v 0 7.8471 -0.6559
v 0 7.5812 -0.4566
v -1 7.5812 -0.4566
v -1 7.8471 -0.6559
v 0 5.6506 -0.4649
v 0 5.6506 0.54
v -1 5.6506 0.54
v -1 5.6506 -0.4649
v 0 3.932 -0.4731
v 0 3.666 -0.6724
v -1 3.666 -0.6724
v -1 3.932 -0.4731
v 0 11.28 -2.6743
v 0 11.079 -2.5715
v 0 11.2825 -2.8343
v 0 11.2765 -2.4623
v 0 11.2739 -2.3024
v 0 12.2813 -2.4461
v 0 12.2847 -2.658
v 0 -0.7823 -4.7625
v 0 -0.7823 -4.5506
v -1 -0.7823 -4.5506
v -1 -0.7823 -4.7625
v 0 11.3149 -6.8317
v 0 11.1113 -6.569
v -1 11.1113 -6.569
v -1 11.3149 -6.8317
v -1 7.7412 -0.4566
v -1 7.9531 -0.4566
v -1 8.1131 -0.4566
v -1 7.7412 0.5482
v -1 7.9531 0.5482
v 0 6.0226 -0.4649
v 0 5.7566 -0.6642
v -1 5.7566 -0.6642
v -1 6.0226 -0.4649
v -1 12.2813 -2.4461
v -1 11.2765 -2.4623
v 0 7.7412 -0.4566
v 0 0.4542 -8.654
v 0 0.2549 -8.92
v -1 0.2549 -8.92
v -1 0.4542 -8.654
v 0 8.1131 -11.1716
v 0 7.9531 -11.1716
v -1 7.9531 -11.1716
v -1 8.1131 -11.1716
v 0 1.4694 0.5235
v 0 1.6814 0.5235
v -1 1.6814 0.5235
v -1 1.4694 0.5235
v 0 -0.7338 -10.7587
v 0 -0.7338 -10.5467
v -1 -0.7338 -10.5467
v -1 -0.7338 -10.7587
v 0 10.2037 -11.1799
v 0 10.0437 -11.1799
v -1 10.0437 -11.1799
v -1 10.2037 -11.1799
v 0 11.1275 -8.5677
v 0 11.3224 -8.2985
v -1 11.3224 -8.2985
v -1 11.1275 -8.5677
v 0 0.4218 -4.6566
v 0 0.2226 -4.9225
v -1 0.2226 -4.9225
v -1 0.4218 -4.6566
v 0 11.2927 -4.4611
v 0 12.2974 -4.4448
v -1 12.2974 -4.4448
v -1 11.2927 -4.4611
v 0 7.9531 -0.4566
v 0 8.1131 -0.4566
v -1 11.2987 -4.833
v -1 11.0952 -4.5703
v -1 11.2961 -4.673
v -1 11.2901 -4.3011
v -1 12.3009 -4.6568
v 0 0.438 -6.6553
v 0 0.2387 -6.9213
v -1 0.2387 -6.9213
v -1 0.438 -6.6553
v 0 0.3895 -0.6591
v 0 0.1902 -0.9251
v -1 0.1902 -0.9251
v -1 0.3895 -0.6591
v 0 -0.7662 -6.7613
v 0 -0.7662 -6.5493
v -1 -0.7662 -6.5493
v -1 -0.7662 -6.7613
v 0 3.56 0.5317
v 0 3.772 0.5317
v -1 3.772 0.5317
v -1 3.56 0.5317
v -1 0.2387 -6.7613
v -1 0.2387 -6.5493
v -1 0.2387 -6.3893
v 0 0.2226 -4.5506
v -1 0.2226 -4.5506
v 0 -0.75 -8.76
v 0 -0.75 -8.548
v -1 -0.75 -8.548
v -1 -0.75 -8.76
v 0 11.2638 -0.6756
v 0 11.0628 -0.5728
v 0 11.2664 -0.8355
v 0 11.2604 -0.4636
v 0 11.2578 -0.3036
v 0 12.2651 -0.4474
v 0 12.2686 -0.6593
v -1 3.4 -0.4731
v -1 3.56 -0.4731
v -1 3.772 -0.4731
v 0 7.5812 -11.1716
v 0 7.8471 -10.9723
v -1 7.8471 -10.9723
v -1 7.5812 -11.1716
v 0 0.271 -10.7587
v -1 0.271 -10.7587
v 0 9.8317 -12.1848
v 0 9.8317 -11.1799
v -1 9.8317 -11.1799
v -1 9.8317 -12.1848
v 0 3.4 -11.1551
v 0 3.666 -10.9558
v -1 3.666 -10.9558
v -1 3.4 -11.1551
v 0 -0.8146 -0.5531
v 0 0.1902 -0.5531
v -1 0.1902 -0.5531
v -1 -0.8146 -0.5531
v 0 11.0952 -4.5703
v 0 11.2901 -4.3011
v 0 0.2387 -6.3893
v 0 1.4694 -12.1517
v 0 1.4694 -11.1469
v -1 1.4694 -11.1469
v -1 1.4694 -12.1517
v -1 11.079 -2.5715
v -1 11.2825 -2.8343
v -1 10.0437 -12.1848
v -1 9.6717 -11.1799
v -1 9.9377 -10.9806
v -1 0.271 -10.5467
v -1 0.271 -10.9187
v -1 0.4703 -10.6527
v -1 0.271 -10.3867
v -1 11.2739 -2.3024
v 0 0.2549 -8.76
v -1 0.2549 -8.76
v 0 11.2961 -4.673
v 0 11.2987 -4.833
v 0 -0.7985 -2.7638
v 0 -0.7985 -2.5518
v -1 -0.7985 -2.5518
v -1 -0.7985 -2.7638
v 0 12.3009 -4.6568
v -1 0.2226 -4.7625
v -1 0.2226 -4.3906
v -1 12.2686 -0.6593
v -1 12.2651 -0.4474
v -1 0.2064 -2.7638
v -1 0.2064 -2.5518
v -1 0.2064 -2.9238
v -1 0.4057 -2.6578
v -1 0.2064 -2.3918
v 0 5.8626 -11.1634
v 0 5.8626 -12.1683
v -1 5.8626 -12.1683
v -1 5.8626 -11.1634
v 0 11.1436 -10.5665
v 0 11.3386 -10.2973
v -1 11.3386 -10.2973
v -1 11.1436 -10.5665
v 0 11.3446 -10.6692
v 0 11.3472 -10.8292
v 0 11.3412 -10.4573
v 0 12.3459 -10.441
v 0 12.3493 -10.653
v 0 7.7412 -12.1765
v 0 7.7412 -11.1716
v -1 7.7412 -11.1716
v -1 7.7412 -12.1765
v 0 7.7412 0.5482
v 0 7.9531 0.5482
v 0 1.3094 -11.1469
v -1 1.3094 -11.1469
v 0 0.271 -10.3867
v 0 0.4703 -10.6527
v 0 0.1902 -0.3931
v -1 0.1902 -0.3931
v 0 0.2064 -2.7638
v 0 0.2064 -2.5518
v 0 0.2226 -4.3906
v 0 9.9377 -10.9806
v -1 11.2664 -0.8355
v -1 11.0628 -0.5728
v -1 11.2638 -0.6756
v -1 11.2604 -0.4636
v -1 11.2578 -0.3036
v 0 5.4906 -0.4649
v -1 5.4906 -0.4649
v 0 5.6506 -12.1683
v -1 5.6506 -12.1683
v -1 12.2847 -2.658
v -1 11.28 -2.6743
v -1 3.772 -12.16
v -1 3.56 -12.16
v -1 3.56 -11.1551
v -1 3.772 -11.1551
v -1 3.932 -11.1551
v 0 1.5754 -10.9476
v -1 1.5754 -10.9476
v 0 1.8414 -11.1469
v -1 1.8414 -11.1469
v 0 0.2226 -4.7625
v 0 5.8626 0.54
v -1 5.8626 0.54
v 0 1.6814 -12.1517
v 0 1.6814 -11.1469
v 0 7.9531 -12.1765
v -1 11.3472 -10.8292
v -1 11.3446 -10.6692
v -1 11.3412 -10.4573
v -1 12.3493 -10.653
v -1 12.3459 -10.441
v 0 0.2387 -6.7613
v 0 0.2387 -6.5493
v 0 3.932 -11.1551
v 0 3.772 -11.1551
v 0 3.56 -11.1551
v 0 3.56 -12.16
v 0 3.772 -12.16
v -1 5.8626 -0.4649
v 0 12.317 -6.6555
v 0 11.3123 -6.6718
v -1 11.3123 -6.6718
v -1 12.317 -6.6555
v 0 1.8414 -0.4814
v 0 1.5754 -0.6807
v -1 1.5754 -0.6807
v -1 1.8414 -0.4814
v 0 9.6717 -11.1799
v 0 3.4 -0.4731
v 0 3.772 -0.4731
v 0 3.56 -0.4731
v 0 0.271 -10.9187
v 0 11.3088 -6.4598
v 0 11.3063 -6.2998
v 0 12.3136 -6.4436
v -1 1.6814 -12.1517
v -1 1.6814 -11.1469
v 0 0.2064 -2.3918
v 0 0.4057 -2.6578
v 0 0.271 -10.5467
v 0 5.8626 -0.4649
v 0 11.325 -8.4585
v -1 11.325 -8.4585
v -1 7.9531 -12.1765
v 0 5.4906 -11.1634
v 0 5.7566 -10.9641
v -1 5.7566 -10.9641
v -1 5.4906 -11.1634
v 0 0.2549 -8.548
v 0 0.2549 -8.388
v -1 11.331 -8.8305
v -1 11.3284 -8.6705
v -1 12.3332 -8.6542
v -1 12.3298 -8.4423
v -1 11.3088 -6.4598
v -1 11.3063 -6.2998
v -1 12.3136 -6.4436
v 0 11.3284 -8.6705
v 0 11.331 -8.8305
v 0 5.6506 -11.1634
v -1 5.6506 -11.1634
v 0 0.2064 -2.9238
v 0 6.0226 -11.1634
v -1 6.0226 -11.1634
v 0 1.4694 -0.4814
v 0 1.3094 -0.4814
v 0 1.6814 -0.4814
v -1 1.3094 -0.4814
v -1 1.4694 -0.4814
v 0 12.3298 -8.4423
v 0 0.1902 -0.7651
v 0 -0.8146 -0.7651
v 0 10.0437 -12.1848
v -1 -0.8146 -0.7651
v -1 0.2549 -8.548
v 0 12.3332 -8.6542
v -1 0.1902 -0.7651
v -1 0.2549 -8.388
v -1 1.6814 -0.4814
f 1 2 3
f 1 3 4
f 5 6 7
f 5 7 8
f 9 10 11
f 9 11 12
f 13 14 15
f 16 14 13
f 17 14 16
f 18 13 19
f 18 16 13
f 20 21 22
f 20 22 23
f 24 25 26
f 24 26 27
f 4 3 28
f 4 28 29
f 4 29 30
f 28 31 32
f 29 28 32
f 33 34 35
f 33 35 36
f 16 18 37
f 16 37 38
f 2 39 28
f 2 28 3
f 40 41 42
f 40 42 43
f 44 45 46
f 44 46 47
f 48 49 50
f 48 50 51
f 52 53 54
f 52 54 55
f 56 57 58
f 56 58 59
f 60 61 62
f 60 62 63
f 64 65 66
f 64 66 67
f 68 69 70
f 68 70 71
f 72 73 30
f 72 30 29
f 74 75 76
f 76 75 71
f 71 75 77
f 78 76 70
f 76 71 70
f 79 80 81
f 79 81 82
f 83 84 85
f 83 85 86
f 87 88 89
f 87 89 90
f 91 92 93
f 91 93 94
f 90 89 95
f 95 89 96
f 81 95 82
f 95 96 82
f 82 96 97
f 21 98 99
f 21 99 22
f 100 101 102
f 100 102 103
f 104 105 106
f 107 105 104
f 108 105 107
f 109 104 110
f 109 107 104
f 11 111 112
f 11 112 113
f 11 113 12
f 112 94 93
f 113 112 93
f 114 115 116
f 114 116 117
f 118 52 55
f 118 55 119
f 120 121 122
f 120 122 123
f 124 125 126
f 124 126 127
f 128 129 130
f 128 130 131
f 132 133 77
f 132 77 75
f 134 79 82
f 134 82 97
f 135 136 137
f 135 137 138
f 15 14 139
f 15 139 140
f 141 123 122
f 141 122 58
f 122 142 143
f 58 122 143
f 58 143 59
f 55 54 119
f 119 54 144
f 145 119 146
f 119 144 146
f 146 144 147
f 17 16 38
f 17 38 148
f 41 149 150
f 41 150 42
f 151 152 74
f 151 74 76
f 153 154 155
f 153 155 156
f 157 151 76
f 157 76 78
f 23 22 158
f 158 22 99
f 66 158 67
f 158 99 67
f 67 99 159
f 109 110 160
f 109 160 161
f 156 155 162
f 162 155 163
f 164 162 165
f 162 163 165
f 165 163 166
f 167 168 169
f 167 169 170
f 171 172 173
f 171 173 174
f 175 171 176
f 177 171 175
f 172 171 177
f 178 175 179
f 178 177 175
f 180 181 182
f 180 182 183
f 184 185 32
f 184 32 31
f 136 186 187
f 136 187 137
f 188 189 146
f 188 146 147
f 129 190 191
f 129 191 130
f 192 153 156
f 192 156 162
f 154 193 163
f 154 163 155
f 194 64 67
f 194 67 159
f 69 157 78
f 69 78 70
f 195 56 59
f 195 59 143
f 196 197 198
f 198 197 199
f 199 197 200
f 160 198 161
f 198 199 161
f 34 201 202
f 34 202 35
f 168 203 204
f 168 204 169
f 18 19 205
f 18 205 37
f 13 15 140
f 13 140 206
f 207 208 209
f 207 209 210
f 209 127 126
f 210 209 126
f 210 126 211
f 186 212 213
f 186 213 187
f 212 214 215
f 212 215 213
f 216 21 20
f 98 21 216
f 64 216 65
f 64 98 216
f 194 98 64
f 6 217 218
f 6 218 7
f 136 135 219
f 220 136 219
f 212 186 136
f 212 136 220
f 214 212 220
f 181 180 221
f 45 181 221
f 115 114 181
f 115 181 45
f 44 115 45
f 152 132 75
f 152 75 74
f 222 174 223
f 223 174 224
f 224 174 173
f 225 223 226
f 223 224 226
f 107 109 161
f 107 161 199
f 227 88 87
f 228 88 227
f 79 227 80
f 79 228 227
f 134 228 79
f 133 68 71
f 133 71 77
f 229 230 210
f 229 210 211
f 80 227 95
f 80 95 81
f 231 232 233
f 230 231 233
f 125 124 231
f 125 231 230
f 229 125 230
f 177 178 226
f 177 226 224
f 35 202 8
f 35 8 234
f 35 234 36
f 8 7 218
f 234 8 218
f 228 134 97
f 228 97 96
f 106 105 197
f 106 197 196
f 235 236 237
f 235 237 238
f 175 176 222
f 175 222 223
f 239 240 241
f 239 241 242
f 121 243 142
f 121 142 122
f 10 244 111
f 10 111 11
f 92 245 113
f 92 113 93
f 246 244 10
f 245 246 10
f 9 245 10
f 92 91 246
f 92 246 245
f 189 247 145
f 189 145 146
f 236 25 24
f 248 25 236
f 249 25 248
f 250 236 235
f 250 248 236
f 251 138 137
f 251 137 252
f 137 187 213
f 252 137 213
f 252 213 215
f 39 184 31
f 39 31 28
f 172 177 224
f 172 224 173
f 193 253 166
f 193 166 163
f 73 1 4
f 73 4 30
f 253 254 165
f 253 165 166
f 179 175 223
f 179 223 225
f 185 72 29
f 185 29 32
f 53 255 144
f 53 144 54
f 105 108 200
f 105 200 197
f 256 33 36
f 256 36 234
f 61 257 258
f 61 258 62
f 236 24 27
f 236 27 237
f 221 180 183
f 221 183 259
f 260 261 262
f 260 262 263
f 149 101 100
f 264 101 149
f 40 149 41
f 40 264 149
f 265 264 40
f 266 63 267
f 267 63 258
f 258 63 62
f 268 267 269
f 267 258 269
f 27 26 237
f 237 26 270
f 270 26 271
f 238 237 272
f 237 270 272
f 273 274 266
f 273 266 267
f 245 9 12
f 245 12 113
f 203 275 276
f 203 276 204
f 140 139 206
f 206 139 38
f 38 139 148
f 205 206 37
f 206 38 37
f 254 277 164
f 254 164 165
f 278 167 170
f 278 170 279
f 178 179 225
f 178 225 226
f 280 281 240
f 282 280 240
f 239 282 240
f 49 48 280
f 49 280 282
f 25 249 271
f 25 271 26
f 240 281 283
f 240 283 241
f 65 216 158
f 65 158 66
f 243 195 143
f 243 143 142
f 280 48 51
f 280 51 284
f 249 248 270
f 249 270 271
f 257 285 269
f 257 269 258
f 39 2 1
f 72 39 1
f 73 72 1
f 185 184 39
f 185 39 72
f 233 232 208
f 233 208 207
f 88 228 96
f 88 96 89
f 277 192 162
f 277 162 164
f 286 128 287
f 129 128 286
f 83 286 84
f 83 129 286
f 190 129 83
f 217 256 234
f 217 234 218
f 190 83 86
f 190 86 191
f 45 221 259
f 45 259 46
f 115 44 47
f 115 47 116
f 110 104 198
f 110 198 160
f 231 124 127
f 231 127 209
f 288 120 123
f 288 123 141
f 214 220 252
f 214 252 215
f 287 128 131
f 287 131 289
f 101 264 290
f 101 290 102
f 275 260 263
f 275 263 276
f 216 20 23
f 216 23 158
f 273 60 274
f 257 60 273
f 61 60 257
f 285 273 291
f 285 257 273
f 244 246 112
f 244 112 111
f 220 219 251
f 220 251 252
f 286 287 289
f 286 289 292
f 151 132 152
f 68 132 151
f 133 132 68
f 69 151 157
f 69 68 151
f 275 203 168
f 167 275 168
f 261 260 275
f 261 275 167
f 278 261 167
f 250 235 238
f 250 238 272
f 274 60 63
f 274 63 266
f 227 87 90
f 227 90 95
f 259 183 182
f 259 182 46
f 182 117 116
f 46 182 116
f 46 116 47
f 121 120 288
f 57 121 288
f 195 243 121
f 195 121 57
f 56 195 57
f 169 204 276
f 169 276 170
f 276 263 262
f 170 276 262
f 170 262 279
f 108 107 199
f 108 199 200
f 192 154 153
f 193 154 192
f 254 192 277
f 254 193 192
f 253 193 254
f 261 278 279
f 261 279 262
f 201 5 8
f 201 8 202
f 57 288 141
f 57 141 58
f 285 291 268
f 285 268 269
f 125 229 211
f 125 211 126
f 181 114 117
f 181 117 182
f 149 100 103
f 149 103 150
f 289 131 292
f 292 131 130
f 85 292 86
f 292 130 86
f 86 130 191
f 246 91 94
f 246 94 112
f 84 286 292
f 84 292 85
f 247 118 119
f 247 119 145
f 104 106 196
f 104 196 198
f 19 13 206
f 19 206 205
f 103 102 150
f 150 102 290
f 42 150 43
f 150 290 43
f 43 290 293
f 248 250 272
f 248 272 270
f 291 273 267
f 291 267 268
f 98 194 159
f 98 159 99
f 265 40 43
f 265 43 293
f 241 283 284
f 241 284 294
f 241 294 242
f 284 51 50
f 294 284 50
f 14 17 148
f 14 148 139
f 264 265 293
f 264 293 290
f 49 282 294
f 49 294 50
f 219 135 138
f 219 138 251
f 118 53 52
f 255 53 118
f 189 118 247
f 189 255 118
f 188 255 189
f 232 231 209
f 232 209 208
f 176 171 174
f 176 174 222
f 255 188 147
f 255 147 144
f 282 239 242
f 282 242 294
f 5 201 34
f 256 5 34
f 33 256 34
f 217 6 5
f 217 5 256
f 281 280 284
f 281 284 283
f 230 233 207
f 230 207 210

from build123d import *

# Parameters (mm, degrees)
F1_DEPTH = 1


# Not quite as in the source:
# - a feature names something its author has since deleted; it is built from what else it names


with BuildPart() as f1:
    # F0 (on Right) → F1 (new body)
    with BuildSketch(Plane.YZ):
        Polygon((-0.733841823, -10.7587281415), (0.2710369828, -10.7587281415), (0.2710369828, -10.9187281415), (0.470318177, -10.6527381415), (0.271038177, -10.3867481415), (0.271038177, -10.5467481415), (-0.733841823, -10.5467481415), align=None)
    extrude(amount=-F1_DEPTH)


with BuildPart() as f1b:
    # F0 (on Right) → F1, piece 2 (new body)
    with BuildSketch(Plane.YZ):
        Polygon((1.3094237074, -11.1468675475), (1.4694237074, -11.1468675475), (1.4694237074, -12.1517463532), (1.6814037074, -12.1517463532), (1.6814037074, -11.1468663532), (1.8414037074, -11.1468663532), (1.5754137074, -10.9475863532), align=None)
    extrude(amount=-F1_DEPTH)


with BuildPart() as f1c:
    # F0 (on Right) → F1, piece 3 (new body)
    with BuildSketch(Plane.YZ):
        Polygon((3.56, -11.1551211942), (3.56, -12.16), (3.77198, -12.16), (3.77198, -11.15512), (3.93198, -11.15512), (3.66599, -10.95584), (3.4, -11.1551211942), align=None)
    extrude(amount=-F1_DEPTH)


with BuildPart() as f1d:
    # F0 (on Right) → F1, piece 4 (new body)
    with BuildSketch(Plane.YZ):
        Polygon((5.6505762926, -11.163374841), (5.6505762926, -12.1682536468), (5.8625562926, -12.1682536468), (5.8625562926, -11.1633736468), (6.0225562926, -11.1633736468), (5.7565662926, -10.9640936468), (5.4905762926, -11.163374841), align=None)
    extrude(amount=-F1_DEPTH)


with BuildPart() as f1e:
    # F0 (on Right) → F1, piece 5 (new body)
    with BuildSketch(Plane.YZ):
        Polygon((7.7411525851, -11.1716284878), (7.7411525851, -12.1765072935), (7.9531325851, -12.1765072935), (7.9531325851, -11.1716272935), (8.1131325851, -11.1716272935), (7.8471425851, -10.9723472935), (7.5811525851, -11.1716284878), align=None)
    extrude(amount=-F1_DEPTH)


with BuildPart() as f1f:
    # F0 (on Right) → F1, piece 6 (new body)
    with BuildSketch(Plane.YZ):
        Polygon((9.8317288777, -11.1798821345), (9.8317288777, -12.1847609403), (10.0437088777, -12.1847609403), (10.0437088777, -11.1798809403), (10.2037088777, -11.1798809403), (9.9377188777, -10.9806009403), (9.6717288777, -11.1798821345), align=None)
    extrude(amount=-F1_DEPTH)


with BuildPart() as f1g:
    # F0 (on Right) → F1, piece 7 (new body)
    with BuildSketch(Plane.YZ):
        Polygon((11.3385786263, -10.2972756044), (11.1436250398, -10.5664526792), (11.3471805551, -10.8291860548), (11.3445937707, -10.6692069669), (12.3493412378, -10.6529606869), (12.3459140719, -10.4410083929), (11.3411654107, -10.4572546922), align=None)
    extrude(amount=-F1_DEPTH)


with BuildPart() as f1h:
    # F0 (on Right) → F1, piece 8 (new body)
    with BuildSketch(Plane.YZ):
        Polygon((11.3310223781, -8.8304579133), (11.3284355937, -8.6704788255), (12.3331830608, -8.6542325454), (12.3297558949, -8.4422802514), (11.3250072337, -8.4585265508), (11.3224204493, -8.2985474629), (11.1274668627, -8.5677245377), align=None)
    extrude(amount=-F1_DEPTH)


with BuildPart() as f1i:
    # F0 (on Right) → F1, piece 9 (new body)
    with BuildSketch(Plane.YZ):
        Polygon((11.3062622723, -6.2998193215), (11.1113086857, -6.5689963962), (11.3148642011, -6.8317297718), (11.3122774167, -6.671750684), (12.3170248838, -6.655504404), (12.3135977178, -6.44355211), (11.3088490566, -6.4597984093), align=None)
    extrude(amount=-F1_DEPTH)


with BuildPart() as f1j:
    # F0 (on Right) → F1, piece 10 (new body)
    with BuildSketch(Plane.YZ):
        Polygon((12.2974395408, -4.4448239685), (11.2926908796, -4.4610702678), (11.2901040952, -4.30109118), (11.0951505087, -4.5702682548), (11.298706024, -4.8330016304), (11.2961192397, -4.6730225425), (12.3008667068, -4.6567762625), align=None)
    extrude(amount=-F1_DEPTH)


with BuildPart() as f1k:
    # F0 (on Right) → F1, piece 11 (new body)
    with BuildSketch(Plane.YZ):
        Polygon((11.2739459182, -2.3023630385), (11.0789923317, -2.5715401133), (11.282547847, -2.8342734889), (11.2799610626, -2.6742944011), (12.2847085298, -2.658048121), (12.2812813638, -2.446095827), (11.2765327026, -2.4623421264), align=None)
    extrude(amount=-F1_DEPTH)


with BuildPart() as f1l:
    # F0 (on Right) → F1, piece 12 (new body)
    with BuildSketch(Plane.YZ):
        Polygon((11.2577877412, -0.3036348971), (11.0628341547, -0.5728119719), (11.26638967, -0.8355453474), (11.2638028856, -0.6755662596), (12.2685503527, -0.6593199796), (12.2651231868, -0.4473676856), (11.2603745256, -0.4636139849), align=None)
    extrude(amount=-F1_DEPTH)


with BuildPart() as f1m:
    # F0 (on Right) → F1, piece 13 (new body)
    with BuildSketch(Plane.YZ):
        Polygon((7.5811525851, -0.4566367399), (7.8471425851, -0.6559179341), (8.1131325851, -0.4566379341), (7.9531325851, -0.4566379341), (7.9531325851, 0.5482420659), (7.7411525851, 0.5482420659), (7.7411525851, -0.4566367399), align=None)
    extrude(amount=-F1_DEPTH)


with BuildPart() as f1n:
    # F0 (on Right) → F1, piece 14 (new body)
    with BuildSketch(Plane.YZ):
        Polygon((5.4905762926, -0.4648903866), (5.7565662926, -0.6641715809), (6.0225562926, -0.4648915809), (5.8625562926, -0.4648915809), (5.8625562926, 0.5399884191), (5.6505762926, 0.5399884191), (5.6505762926, -0.4648903866), align=None)
    extrude(amount=-F1_DEPTH)


with BuildPart() as f1o:
    # F0 (on Right) → F1, piece 15 (new body)
    with BuildSketch(Plane.YZ):
        Polygon((3.77198, 0.5317347724), (3.56, 0.5317347724), (3.56, -0.4731440334), (3.4, -0.4731440334), (3.66599, -0.6724252276), (3.93198, -0.4731452276), (3.77198, -0.4731452276), align=None)
    extrude(amount=-F1_DEPTH)


with BuildPart() as f1p:
    # F0 (on Right) → F1, piece 16 (new body)
    with BuildSketch(Plane.YZ):
        Polygon((1.4694237074, 0.5234811256), (1.4694237074, -0.4813976802), (1.3094237074, -0.4813976802), (1.5754137074, -0.6806788744), (1.8414037074, -0.4813988744), (1.6814037074, -0.4813988744), (1.6814037074, 0.5234811256), align=None)
    extrude(amount=-F1_DEPTH)


with BuildPart() as f1q:
    # F0 (on Right) → F1, piece 17 (new body)
    with BuildSketch(Plane.YZ):
        Polygon((0.1902472919, -0.5531074341), (-0.8146327081, -0.5531074341), (-0.8146327081, -0.7650874341), (0.1902460977, -0.7650874341), (0.1902460977, -0.9250874341), (0.3895272919, -0.6590974341), (0.1902472919, -0.3931074341), align=None)
    extrude(amount=-F1_DEPTH)


with BuildPart() as f1r:
    # F0 (on Right) → F1, piece 18 (new body)
    with BuildSketch(Plane.YZ):
        Polygon((0.2064054689, -2.5518355756), (-0.7984745311, -2.5518355756), (-0.7984745311, -2.7638155756), (0.2064042747, -2.7638155756), (0.2064042747, -2.9238155756), (0.4056854689, -2.6578255756), (0.2064054689, -2.3918355756), align=None)
    extrude(amount=-F1_DEPTH)


with BuildPart() as f1s:
    # F0 (on Right) → F1, piece 19 (new body)
    with BuildSketch(Plane.YZ):
        Polygon((0.222563646, -4.5505637171), (-0.782316354, -4.5505637171), (-0.782316354, -4.7625437171), (0.2225624517, -4.7625437171), (0.2225624517, -4.9225437171), (0.421843646, -4.6565537171), (0.222563646, -4.3905637171), align=None)
    extrude(amount=-F1_DEPTH)


with BuildPart() as f1t:
    # F0 (on Right) → F1, piece 20 (new body)
    with BuildSketch(Plane.YZ):
        Polygon((0.238721823, -6.5492918585), (-0.766158177, -6.5492918585), (-0.766158177, -6.7612718585), (0.2387206288, -6.7612718585), (0.2387206288, -6.9212718585), (0.438001823, -6.6552818585), (0.238721823, -6.3892918585), align=None)
    extrude(amount=-F1_DEPTH)


with BuildPart() as f1u:
    # F0 (on Right) → F1, piece 21 (new body)
    with BuildSketch(Plane.YZ):
        Polygon((0.25488, -8.54802), (-0.75, -8.54802), (-0.75, -8.76), (0.2548788058, -8.76), (0.2548788058, -8.92), (0.45416, -8.65401), (0.25488, -8.38802), align=None)
    extrude(amount=-F1_DEPTH)


solid = Compound([f1.part, f1b.part, f1c.part, f1d.part, f1e.part, f1f.part, f1g.part, f1h.part, f1i.part, f1j.part, f1k.part, f1l.part, f1m.part, f1n.part, f1o.part, f1p.part, f1q.part, f1r.part, f1s.part, f1t.part, f1u.part])
